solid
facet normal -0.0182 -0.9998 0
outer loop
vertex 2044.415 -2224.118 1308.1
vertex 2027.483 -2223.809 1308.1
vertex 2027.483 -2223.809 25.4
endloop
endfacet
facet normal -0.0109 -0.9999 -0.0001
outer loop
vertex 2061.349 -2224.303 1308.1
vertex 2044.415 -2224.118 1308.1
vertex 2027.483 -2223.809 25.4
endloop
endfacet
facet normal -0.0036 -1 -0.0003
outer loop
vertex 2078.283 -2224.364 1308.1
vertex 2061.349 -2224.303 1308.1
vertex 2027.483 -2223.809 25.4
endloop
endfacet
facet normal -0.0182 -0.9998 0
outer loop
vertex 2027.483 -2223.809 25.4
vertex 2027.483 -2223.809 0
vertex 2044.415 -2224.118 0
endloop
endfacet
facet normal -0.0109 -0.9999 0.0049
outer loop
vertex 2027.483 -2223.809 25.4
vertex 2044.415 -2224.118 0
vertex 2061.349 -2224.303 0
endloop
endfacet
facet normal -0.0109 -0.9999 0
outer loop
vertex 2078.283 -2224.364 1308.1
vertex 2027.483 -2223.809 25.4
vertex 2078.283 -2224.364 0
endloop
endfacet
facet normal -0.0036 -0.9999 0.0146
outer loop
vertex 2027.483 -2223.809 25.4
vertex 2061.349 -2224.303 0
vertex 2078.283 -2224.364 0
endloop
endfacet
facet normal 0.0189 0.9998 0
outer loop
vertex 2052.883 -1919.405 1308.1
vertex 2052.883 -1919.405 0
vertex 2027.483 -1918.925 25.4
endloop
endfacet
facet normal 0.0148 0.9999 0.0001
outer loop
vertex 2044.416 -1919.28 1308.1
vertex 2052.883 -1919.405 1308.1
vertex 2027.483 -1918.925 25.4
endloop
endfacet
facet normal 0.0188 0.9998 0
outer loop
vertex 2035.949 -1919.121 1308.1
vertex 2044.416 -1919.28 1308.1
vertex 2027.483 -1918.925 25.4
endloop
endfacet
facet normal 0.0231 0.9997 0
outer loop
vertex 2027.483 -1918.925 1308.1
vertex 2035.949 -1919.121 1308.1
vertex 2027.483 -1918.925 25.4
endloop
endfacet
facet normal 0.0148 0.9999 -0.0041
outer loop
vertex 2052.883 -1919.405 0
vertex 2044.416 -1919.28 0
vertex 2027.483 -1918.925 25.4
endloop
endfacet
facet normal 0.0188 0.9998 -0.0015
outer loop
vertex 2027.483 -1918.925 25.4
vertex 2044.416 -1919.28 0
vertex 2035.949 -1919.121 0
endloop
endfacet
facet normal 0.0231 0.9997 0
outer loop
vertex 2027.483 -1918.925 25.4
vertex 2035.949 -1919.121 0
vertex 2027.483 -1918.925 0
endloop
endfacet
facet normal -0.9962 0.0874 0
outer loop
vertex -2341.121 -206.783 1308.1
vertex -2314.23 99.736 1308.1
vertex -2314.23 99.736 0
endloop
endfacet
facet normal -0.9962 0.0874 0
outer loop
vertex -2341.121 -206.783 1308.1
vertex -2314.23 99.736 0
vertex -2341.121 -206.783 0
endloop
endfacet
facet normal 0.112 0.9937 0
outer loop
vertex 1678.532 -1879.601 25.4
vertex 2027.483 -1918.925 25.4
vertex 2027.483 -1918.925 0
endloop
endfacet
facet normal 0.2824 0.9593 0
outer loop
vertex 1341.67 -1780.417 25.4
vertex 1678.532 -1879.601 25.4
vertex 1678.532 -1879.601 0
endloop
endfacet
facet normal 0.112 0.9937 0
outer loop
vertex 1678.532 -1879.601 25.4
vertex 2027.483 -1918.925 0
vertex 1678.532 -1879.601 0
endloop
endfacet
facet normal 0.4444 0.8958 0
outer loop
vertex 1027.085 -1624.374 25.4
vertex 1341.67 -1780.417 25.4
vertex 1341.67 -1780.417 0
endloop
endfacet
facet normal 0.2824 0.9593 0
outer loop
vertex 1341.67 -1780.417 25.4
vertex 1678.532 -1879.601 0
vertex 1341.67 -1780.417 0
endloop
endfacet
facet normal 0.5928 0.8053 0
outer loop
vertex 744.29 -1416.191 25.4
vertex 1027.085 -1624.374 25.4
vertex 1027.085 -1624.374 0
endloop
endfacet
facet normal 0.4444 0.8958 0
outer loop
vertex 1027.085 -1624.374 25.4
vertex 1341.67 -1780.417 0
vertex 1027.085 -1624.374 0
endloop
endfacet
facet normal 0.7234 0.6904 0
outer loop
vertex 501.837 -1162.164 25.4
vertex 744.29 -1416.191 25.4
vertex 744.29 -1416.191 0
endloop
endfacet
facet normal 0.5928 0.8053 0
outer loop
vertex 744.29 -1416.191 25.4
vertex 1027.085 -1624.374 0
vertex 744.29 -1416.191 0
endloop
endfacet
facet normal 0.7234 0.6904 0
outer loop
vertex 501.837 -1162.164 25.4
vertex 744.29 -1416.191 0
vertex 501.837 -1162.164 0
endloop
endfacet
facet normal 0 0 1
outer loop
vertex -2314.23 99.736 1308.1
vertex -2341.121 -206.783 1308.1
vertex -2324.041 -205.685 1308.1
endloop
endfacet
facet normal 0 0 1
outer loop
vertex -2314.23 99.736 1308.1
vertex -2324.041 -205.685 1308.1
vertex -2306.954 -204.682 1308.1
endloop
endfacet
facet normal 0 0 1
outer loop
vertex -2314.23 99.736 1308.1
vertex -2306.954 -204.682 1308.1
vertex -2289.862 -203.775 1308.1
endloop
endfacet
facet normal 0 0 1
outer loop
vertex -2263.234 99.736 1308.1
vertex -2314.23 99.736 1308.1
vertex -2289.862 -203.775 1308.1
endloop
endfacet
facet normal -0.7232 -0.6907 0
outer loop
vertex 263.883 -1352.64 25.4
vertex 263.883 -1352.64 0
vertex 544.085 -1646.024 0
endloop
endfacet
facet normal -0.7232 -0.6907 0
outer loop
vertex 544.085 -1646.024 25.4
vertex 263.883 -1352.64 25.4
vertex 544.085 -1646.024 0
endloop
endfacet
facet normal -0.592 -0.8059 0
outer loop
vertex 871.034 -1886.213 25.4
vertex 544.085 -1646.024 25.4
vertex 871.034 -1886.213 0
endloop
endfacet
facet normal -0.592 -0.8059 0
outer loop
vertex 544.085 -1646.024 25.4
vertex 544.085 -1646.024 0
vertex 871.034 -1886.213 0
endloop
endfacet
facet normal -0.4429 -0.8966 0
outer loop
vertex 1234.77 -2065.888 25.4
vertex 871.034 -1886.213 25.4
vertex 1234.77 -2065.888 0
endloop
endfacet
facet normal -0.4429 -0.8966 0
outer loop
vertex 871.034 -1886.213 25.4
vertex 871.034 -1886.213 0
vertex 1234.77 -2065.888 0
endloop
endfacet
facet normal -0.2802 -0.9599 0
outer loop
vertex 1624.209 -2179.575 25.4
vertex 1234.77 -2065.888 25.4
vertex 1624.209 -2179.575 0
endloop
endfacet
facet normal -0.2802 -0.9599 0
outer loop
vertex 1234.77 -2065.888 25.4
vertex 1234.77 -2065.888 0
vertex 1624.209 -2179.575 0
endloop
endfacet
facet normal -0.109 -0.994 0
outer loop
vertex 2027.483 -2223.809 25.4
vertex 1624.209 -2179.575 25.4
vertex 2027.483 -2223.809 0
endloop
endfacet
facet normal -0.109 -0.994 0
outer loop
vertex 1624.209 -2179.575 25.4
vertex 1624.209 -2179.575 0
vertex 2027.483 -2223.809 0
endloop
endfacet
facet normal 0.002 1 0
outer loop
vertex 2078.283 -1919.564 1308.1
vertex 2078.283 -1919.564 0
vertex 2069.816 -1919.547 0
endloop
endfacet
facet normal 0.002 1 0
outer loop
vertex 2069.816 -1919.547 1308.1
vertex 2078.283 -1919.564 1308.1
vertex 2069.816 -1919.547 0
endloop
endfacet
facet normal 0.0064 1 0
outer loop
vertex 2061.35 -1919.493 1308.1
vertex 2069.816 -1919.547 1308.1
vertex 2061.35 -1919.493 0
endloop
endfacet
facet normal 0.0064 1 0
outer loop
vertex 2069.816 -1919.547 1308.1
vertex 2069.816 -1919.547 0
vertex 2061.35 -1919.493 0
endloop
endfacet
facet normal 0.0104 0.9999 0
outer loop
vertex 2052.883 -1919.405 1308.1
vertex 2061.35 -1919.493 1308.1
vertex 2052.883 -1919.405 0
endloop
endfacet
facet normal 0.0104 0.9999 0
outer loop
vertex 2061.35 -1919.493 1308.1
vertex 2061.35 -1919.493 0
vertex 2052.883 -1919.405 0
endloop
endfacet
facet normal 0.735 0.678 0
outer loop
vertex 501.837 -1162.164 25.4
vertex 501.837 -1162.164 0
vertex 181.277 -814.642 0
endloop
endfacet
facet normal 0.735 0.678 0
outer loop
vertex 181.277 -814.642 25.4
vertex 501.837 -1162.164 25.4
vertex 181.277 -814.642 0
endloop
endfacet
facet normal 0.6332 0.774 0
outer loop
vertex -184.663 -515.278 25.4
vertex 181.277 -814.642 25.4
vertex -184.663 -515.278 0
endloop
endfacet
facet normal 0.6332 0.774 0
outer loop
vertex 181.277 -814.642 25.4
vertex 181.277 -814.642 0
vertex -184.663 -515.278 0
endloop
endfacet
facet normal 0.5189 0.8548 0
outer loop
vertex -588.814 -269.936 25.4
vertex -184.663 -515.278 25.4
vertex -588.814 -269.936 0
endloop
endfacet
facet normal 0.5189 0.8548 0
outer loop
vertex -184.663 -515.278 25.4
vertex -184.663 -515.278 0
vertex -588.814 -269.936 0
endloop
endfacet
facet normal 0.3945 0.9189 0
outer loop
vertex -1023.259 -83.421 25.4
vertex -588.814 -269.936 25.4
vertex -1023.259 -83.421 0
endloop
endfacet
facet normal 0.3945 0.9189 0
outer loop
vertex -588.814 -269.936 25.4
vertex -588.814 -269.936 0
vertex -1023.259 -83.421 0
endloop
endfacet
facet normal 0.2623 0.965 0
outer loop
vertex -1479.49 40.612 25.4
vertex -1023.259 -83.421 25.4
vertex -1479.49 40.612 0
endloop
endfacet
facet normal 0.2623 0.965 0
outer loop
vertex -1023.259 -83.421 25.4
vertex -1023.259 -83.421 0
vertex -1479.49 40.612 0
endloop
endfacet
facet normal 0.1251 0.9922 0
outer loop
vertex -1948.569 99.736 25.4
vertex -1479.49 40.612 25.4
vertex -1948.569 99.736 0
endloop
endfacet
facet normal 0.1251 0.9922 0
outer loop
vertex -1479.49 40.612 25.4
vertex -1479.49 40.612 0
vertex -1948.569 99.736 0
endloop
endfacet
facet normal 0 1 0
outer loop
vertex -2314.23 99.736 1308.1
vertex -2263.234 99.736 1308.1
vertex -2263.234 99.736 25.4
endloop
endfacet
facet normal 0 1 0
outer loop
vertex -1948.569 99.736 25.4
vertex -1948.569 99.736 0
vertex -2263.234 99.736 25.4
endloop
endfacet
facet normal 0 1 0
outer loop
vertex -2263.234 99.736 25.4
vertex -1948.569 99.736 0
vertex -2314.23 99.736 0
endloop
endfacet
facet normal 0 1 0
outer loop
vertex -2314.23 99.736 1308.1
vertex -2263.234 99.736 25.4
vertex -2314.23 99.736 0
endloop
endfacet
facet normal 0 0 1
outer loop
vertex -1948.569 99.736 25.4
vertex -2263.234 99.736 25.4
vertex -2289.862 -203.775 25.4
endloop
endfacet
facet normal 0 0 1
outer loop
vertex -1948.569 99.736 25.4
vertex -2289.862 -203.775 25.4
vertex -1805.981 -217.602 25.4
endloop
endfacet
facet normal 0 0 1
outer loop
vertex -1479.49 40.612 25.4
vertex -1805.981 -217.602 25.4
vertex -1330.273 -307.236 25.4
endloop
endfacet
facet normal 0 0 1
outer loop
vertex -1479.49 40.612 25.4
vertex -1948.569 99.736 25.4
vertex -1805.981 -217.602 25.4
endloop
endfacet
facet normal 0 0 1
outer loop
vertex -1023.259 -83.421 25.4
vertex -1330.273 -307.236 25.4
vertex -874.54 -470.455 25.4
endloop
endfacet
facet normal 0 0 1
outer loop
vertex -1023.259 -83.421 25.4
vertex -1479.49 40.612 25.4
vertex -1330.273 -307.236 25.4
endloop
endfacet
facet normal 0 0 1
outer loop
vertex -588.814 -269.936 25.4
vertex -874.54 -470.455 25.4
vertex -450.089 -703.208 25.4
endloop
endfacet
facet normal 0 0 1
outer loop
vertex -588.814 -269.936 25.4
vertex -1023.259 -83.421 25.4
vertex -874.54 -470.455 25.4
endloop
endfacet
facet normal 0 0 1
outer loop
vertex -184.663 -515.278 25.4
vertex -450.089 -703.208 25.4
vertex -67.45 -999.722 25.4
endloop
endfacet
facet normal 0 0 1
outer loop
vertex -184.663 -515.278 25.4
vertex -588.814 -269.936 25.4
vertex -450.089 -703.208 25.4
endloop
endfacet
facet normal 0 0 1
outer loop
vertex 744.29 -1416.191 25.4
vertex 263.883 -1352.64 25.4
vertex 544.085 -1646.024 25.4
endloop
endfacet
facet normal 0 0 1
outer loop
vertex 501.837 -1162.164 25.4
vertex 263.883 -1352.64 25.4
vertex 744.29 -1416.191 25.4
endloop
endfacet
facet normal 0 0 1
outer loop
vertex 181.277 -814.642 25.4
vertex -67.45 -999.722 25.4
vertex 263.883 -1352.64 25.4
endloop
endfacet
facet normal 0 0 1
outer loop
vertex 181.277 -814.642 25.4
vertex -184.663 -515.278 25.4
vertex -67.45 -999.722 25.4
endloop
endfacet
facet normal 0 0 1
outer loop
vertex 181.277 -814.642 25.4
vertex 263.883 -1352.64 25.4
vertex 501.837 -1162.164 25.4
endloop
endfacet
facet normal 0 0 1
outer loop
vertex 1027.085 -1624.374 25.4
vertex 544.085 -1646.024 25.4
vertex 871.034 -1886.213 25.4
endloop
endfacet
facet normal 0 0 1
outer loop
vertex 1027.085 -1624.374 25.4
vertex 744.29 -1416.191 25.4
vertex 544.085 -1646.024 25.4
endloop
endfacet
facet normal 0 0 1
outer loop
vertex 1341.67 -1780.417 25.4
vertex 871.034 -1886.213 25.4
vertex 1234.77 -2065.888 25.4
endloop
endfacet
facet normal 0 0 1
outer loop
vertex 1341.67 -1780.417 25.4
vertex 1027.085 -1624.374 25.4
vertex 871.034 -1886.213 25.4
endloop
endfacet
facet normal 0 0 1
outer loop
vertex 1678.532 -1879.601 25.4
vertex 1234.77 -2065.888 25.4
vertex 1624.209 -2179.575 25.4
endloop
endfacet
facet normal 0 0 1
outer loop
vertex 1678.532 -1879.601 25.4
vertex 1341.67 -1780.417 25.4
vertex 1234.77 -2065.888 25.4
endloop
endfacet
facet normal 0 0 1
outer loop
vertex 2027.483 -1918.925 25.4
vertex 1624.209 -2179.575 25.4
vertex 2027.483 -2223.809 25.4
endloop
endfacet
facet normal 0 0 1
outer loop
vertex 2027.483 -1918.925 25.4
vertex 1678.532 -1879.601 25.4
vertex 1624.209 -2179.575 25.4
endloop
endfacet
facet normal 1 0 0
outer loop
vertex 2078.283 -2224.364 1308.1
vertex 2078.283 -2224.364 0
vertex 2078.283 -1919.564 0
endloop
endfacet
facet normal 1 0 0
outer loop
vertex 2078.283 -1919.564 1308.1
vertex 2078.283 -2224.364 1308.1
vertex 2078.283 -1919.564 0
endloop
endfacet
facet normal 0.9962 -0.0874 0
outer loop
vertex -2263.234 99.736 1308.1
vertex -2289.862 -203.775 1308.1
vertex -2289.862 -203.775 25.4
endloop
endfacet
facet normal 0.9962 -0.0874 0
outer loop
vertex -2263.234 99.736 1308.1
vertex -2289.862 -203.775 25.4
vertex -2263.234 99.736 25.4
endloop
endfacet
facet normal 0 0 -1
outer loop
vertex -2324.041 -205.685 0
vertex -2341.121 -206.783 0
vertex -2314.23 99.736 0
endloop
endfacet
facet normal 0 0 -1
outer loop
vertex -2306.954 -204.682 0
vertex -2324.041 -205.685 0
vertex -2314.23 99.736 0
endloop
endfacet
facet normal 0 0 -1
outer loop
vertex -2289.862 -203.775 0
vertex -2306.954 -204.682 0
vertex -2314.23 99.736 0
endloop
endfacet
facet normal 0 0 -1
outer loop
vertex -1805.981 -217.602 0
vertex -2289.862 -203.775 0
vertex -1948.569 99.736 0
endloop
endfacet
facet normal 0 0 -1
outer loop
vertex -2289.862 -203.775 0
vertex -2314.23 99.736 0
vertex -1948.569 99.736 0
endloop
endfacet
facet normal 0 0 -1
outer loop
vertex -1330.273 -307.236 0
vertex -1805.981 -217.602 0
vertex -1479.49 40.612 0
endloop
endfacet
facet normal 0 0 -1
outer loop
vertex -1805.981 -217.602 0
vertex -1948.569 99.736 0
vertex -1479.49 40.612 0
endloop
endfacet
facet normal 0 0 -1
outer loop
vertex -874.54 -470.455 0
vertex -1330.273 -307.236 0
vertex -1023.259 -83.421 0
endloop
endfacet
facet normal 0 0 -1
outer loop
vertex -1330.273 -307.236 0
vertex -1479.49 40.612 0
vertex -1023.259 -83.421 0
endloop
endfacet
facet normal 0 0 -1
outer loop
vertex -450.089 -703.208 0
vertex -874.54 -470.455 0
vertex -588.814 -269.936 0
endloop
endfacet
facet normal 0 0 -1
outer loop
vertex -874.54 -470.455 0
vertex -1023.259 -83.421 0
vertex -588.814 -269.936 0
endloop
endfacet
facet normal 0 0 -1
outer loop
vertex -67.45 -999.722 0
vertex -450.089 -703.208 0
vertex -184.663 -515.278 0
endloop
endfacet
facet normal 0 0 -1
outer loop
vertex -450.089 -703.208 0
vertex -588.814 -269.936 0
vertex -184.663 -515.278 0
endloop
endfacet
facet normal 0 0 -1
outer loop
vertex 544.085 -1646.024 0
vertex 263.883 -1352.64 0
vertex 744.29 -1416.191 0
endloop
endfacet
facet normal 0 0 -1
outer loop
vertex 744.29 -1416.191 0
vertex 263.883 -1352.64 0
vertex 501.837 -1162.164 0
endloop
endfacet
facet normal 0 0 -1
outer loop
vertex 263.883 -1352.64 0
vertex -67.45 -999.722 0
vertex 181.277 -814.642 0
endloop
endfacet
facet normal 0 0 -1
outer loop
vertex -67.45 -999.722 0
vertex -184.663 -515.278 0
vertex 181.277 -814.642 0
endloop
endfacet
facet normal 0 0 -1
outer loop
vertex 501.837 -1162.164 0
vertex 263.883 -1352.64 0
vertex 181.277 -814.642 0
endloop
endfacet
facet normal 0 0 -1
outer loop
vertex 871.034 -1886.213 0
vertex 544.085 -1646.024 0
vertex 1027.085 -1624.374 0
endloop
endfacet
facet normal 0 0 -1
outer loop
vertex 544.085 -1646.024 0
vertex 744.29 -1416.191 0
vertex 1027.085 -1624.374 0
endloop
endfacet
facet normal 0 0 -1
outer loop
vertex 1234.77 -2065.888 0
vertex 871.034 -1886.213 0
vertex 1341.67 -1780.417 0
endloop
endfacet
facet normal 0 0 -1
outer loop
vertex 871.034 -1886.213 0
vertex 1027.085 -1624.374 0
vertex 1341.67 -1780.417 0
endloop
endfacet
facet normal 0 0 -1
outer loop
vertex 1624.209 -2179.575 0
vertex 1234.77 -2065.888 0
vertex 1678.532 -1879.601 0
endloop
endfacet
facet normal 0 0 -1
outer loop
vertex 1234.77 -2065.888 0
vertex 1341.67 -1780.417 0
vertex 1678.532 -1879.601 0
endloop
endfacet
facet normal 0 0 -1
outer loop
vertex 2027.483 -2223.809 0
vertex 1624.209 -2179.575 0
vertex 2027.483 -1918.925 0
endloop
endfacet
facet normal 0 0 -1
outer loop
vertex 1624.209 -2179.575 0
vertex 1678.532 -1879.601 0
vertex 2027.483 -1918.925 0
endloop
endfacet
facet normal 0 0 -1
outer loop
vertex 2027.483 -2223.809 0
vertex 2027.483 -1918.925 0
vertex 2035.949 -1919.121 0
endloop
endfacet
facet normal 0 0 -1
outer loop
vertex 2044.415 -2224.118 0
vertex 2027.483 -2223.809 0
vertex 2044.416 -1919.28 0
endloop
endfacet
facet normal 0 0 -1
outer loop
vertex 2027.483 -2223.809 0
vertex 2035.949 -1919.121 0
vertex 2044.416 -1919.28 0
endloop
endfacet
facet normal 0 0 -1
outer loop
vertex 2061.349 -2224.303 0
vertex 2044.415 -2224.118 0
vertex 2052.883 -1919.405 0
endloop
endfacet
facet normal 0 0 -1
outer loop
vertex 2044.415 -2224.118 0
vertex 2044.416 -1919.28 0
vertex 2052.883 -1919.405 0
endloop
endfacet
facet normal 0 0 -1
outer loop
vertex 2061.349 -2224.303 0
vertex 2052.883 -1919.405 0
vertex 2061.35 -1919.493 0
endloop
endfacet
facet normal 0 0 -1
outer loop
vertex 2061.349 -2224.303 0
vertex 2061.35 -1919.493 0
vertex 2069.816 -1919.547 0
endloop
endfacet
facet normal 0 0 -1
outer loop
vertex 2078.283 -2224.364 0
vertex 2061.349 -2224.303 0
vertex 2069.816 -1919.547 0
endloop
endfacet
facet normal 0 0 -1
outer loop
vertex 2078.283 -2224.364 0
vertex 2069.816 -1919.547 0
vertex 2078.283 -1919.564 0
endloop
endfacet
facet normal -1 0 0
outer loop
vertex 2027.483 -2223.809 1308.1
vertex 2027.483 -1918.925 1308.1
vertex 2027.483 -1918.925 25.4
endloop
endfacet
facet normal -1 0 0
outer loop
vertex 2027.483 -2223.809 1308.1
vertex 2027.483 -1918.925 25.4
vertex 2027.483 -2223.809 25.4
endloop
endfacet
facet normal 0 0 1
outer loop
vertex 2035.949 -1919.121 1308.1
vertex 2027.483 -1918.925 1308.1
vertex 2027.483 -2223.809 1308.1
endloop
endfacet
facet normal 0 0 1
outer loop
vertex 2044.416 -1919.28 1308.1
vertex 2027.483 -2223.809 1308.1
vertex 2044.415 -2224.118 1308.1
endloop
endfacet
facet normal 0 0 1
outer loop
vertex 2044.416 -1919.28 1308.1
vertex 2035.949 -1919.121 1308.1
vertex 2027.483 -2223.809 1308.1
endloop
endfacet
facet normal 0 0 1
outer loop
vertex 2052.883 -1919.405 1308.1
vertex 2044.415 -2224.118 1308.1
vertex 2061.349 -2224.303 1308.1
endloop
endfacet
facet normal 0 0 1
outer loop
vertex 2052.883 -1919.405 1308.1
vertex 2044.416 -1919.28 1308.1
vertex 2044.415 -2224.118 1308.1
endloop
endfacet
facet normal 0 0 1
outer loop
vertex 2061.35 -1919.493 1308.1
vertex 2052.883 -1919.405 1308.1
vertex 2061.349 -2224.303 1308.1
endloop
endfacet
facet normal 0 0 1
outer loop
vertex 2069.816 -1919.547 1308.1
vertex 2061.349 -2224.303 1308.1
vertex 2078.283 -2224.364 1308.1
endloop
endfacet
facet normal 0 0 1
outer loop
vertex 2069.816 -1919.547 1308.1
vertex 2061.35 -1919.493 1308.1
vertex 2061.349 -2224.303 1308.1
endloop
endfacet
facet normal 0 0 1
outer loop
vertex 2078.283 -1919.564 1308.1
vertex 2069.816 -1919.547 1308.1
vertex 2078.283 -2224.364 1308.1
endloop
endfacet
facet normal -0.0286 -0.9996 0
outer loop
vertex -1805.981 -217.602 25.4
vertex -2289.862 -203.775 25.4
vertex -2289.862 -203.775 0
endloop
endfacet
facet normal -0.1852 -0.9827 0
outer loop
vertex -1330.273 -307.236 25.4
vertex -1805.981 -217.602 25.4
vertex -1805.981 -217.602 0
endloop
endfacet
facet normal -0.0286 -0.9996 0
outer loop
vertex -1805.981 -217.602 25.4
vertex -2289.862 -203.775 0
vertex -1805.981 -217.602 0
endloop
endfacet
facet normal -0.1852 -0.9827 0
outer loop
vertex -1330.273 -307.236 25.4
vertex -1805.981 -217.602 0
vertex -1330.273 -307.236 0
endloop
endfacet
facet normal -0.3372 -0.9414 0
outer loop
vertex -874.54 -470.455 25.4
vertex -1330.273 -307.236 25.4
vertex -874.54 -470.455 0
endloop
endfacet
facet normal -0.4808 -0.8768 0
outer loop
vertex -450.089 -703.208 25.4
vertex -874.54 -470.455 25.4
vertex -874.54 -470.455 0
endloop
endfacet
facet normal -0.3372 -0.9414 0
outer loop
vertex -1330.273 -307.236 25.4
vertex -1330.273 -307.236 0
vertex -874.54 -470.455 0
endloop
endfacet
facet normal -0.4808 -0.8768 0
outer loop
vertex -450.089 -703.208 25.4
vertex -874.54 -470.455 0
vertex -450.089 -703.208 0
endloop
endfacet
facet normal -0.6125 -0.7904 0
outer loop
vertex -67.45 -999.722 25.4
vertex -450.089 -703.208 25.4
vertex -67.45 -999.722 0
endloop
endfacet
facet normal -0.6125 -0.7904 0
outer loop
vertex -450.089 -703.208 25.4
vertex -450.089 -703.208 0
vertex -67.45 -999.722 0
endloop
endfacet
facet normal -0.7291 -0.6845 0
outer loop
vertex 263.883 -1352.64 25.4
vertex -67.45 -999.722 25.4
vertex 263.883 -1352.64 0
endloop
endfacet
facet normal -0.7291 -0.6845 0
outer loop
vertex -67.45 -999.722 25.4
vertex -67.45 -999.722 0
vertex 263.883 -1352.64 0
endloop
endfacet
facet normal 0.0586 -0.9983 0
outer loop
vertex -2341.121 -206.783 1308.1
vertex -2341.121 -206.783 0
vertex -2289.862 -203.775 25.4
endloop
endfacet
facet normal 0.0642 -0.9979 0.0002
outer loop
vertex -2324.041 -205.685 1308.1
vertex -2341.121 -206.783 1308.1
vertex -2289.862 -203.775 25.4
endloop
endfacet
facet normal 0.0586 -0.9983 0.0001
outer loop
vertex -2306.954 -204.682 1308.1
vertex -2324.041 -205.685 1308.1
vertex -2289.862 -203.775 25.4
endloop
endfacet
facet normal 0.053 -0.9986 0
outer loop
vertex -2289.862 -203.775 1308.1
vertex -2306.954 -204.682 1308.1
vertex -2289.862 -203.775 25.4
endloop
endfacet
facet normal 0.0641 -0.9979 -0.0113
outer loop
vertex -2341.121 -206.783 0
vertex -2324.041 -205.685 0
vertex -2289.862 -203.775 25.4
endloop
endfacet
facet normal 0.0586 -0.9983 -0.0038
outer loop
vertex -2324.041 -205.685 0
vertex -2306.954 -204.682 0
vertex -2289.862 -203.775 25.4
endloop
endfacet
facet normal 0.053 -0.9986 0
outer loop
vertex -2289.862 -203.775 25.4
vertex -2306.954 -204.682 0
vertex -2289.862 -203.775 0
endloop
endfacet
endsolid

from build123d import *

# Parameters (mm, degrees)
F1_DEPTH = 25.4
F2_DEPTH = 1308.1
F3_DEPTH = 25.4
F4_DEPTH = 1308.1


with BuildPart() as f1:
    # F0 (on Top) → F1 (new body)
    with BuildSketch(Plane.XY):
        with BuildLine():
            Line((-1948.5691277788, 99.7355101007), (-2263.234400171, 99.7355101007))
            Line((-2263.234400171, 99.7355101007), (-2289.862411819, -203.7745007557))
            ThreePointArc((-2289.862411819, -203.7745007557), (-874.5398284023, -470.4550472357), (263.8832180742, -1352.6395496224))
            ThreePointArc((263.8832180742, -1352.6395496224), (346.7538874408, -1450.5053929427), (434.8963853674, -1543.651360055))
            Line((434.8963853674, -1543.651360055), (650.422532273, -1328.1252131493))
            ThreePointArc((650.422532273, -1328.1252131493), (573.8397062056, -1247.1951105763), (501.8373213462, -1162.1641319538))
            ThreePointArc((501.8373213462, -1162.1641319538), (-588.8138343544, -269.9358016898), (-1948.5691277788, 99.7355101007))
        make_face()
    extrude(amount=F1_DEPTH)

    # F0 (on Top) → F2 (join)
    with BuildSketch(Plane.XY):
        with BuildLine():
            Line((-2263.234400171, 99.7355101007), (-2314.2295336755, 99.7355101007))
            Line((-2314.2295336755, 99.7355101007), (-2341.1214825581, -206.7828963515))
            ThreePointArc((-2341.1214825581, -206.7828963515), (-2315.4982300933, -205.1716461899), (-2289.862411819, -203.7745007557))
            Line((-2289.862411819, -203.7745007557), (-2263.234400171, 99.7355101007))
        make_face()
    extrude(amount=F2_DEPTH)

    # F0 (on Top) → F3 (join)
    with BuildSketch(Plane.XY):
        with BuildLine():
            ThreePointArc((2027.483255523, -1918.925395054), (1282.1233486229, -1755.9858840328), (650.422532273, -1328.1252131493))
            Line((650.422532273, -1328.1252131493), (434.8963853674, -1543.651360055))
            ThreePointArc((434.8963853674, -1543.651360055), (1165.4738720531, -2037.6039199968), (2027.483255523, -2223.8092323134))
            Line((2027.483255523, -2223.8092323134), (2027.483255523, -1918.925395054))
        make_face()
    extrude(amount=F3_DEPTH)

    # F0 (on Top) → F4 (join)
    with BuildSketch(Plane.XY):
        with BuildLine():
            ThreePointArc((2052.883255523, -1919.4047351522), (2040.182501702, -1919.2050097162), (2027.483255523, -1918.925395054))
            Line((2027.483255523, -1918.925395054), (2027.483255523, -2223.8092323134))
            ThreePointArc((2027.483255523, -2223.8092323134), (2052.8817382899, -2224.225671357), (2078.283255523, -2224.3644898993))
            Line((2078.283255523, -2224.3644898993), (2078.283255523, -1919.5644898993))
            ThreePointArc((2078.283255523, -1919.5644898993), (2065.5830043289, -1919.5245508176), (2052.883255523, -1919.4047351522))
        make_face()
    extrude(amount=F4_DEPTH)


solid = f1.part
